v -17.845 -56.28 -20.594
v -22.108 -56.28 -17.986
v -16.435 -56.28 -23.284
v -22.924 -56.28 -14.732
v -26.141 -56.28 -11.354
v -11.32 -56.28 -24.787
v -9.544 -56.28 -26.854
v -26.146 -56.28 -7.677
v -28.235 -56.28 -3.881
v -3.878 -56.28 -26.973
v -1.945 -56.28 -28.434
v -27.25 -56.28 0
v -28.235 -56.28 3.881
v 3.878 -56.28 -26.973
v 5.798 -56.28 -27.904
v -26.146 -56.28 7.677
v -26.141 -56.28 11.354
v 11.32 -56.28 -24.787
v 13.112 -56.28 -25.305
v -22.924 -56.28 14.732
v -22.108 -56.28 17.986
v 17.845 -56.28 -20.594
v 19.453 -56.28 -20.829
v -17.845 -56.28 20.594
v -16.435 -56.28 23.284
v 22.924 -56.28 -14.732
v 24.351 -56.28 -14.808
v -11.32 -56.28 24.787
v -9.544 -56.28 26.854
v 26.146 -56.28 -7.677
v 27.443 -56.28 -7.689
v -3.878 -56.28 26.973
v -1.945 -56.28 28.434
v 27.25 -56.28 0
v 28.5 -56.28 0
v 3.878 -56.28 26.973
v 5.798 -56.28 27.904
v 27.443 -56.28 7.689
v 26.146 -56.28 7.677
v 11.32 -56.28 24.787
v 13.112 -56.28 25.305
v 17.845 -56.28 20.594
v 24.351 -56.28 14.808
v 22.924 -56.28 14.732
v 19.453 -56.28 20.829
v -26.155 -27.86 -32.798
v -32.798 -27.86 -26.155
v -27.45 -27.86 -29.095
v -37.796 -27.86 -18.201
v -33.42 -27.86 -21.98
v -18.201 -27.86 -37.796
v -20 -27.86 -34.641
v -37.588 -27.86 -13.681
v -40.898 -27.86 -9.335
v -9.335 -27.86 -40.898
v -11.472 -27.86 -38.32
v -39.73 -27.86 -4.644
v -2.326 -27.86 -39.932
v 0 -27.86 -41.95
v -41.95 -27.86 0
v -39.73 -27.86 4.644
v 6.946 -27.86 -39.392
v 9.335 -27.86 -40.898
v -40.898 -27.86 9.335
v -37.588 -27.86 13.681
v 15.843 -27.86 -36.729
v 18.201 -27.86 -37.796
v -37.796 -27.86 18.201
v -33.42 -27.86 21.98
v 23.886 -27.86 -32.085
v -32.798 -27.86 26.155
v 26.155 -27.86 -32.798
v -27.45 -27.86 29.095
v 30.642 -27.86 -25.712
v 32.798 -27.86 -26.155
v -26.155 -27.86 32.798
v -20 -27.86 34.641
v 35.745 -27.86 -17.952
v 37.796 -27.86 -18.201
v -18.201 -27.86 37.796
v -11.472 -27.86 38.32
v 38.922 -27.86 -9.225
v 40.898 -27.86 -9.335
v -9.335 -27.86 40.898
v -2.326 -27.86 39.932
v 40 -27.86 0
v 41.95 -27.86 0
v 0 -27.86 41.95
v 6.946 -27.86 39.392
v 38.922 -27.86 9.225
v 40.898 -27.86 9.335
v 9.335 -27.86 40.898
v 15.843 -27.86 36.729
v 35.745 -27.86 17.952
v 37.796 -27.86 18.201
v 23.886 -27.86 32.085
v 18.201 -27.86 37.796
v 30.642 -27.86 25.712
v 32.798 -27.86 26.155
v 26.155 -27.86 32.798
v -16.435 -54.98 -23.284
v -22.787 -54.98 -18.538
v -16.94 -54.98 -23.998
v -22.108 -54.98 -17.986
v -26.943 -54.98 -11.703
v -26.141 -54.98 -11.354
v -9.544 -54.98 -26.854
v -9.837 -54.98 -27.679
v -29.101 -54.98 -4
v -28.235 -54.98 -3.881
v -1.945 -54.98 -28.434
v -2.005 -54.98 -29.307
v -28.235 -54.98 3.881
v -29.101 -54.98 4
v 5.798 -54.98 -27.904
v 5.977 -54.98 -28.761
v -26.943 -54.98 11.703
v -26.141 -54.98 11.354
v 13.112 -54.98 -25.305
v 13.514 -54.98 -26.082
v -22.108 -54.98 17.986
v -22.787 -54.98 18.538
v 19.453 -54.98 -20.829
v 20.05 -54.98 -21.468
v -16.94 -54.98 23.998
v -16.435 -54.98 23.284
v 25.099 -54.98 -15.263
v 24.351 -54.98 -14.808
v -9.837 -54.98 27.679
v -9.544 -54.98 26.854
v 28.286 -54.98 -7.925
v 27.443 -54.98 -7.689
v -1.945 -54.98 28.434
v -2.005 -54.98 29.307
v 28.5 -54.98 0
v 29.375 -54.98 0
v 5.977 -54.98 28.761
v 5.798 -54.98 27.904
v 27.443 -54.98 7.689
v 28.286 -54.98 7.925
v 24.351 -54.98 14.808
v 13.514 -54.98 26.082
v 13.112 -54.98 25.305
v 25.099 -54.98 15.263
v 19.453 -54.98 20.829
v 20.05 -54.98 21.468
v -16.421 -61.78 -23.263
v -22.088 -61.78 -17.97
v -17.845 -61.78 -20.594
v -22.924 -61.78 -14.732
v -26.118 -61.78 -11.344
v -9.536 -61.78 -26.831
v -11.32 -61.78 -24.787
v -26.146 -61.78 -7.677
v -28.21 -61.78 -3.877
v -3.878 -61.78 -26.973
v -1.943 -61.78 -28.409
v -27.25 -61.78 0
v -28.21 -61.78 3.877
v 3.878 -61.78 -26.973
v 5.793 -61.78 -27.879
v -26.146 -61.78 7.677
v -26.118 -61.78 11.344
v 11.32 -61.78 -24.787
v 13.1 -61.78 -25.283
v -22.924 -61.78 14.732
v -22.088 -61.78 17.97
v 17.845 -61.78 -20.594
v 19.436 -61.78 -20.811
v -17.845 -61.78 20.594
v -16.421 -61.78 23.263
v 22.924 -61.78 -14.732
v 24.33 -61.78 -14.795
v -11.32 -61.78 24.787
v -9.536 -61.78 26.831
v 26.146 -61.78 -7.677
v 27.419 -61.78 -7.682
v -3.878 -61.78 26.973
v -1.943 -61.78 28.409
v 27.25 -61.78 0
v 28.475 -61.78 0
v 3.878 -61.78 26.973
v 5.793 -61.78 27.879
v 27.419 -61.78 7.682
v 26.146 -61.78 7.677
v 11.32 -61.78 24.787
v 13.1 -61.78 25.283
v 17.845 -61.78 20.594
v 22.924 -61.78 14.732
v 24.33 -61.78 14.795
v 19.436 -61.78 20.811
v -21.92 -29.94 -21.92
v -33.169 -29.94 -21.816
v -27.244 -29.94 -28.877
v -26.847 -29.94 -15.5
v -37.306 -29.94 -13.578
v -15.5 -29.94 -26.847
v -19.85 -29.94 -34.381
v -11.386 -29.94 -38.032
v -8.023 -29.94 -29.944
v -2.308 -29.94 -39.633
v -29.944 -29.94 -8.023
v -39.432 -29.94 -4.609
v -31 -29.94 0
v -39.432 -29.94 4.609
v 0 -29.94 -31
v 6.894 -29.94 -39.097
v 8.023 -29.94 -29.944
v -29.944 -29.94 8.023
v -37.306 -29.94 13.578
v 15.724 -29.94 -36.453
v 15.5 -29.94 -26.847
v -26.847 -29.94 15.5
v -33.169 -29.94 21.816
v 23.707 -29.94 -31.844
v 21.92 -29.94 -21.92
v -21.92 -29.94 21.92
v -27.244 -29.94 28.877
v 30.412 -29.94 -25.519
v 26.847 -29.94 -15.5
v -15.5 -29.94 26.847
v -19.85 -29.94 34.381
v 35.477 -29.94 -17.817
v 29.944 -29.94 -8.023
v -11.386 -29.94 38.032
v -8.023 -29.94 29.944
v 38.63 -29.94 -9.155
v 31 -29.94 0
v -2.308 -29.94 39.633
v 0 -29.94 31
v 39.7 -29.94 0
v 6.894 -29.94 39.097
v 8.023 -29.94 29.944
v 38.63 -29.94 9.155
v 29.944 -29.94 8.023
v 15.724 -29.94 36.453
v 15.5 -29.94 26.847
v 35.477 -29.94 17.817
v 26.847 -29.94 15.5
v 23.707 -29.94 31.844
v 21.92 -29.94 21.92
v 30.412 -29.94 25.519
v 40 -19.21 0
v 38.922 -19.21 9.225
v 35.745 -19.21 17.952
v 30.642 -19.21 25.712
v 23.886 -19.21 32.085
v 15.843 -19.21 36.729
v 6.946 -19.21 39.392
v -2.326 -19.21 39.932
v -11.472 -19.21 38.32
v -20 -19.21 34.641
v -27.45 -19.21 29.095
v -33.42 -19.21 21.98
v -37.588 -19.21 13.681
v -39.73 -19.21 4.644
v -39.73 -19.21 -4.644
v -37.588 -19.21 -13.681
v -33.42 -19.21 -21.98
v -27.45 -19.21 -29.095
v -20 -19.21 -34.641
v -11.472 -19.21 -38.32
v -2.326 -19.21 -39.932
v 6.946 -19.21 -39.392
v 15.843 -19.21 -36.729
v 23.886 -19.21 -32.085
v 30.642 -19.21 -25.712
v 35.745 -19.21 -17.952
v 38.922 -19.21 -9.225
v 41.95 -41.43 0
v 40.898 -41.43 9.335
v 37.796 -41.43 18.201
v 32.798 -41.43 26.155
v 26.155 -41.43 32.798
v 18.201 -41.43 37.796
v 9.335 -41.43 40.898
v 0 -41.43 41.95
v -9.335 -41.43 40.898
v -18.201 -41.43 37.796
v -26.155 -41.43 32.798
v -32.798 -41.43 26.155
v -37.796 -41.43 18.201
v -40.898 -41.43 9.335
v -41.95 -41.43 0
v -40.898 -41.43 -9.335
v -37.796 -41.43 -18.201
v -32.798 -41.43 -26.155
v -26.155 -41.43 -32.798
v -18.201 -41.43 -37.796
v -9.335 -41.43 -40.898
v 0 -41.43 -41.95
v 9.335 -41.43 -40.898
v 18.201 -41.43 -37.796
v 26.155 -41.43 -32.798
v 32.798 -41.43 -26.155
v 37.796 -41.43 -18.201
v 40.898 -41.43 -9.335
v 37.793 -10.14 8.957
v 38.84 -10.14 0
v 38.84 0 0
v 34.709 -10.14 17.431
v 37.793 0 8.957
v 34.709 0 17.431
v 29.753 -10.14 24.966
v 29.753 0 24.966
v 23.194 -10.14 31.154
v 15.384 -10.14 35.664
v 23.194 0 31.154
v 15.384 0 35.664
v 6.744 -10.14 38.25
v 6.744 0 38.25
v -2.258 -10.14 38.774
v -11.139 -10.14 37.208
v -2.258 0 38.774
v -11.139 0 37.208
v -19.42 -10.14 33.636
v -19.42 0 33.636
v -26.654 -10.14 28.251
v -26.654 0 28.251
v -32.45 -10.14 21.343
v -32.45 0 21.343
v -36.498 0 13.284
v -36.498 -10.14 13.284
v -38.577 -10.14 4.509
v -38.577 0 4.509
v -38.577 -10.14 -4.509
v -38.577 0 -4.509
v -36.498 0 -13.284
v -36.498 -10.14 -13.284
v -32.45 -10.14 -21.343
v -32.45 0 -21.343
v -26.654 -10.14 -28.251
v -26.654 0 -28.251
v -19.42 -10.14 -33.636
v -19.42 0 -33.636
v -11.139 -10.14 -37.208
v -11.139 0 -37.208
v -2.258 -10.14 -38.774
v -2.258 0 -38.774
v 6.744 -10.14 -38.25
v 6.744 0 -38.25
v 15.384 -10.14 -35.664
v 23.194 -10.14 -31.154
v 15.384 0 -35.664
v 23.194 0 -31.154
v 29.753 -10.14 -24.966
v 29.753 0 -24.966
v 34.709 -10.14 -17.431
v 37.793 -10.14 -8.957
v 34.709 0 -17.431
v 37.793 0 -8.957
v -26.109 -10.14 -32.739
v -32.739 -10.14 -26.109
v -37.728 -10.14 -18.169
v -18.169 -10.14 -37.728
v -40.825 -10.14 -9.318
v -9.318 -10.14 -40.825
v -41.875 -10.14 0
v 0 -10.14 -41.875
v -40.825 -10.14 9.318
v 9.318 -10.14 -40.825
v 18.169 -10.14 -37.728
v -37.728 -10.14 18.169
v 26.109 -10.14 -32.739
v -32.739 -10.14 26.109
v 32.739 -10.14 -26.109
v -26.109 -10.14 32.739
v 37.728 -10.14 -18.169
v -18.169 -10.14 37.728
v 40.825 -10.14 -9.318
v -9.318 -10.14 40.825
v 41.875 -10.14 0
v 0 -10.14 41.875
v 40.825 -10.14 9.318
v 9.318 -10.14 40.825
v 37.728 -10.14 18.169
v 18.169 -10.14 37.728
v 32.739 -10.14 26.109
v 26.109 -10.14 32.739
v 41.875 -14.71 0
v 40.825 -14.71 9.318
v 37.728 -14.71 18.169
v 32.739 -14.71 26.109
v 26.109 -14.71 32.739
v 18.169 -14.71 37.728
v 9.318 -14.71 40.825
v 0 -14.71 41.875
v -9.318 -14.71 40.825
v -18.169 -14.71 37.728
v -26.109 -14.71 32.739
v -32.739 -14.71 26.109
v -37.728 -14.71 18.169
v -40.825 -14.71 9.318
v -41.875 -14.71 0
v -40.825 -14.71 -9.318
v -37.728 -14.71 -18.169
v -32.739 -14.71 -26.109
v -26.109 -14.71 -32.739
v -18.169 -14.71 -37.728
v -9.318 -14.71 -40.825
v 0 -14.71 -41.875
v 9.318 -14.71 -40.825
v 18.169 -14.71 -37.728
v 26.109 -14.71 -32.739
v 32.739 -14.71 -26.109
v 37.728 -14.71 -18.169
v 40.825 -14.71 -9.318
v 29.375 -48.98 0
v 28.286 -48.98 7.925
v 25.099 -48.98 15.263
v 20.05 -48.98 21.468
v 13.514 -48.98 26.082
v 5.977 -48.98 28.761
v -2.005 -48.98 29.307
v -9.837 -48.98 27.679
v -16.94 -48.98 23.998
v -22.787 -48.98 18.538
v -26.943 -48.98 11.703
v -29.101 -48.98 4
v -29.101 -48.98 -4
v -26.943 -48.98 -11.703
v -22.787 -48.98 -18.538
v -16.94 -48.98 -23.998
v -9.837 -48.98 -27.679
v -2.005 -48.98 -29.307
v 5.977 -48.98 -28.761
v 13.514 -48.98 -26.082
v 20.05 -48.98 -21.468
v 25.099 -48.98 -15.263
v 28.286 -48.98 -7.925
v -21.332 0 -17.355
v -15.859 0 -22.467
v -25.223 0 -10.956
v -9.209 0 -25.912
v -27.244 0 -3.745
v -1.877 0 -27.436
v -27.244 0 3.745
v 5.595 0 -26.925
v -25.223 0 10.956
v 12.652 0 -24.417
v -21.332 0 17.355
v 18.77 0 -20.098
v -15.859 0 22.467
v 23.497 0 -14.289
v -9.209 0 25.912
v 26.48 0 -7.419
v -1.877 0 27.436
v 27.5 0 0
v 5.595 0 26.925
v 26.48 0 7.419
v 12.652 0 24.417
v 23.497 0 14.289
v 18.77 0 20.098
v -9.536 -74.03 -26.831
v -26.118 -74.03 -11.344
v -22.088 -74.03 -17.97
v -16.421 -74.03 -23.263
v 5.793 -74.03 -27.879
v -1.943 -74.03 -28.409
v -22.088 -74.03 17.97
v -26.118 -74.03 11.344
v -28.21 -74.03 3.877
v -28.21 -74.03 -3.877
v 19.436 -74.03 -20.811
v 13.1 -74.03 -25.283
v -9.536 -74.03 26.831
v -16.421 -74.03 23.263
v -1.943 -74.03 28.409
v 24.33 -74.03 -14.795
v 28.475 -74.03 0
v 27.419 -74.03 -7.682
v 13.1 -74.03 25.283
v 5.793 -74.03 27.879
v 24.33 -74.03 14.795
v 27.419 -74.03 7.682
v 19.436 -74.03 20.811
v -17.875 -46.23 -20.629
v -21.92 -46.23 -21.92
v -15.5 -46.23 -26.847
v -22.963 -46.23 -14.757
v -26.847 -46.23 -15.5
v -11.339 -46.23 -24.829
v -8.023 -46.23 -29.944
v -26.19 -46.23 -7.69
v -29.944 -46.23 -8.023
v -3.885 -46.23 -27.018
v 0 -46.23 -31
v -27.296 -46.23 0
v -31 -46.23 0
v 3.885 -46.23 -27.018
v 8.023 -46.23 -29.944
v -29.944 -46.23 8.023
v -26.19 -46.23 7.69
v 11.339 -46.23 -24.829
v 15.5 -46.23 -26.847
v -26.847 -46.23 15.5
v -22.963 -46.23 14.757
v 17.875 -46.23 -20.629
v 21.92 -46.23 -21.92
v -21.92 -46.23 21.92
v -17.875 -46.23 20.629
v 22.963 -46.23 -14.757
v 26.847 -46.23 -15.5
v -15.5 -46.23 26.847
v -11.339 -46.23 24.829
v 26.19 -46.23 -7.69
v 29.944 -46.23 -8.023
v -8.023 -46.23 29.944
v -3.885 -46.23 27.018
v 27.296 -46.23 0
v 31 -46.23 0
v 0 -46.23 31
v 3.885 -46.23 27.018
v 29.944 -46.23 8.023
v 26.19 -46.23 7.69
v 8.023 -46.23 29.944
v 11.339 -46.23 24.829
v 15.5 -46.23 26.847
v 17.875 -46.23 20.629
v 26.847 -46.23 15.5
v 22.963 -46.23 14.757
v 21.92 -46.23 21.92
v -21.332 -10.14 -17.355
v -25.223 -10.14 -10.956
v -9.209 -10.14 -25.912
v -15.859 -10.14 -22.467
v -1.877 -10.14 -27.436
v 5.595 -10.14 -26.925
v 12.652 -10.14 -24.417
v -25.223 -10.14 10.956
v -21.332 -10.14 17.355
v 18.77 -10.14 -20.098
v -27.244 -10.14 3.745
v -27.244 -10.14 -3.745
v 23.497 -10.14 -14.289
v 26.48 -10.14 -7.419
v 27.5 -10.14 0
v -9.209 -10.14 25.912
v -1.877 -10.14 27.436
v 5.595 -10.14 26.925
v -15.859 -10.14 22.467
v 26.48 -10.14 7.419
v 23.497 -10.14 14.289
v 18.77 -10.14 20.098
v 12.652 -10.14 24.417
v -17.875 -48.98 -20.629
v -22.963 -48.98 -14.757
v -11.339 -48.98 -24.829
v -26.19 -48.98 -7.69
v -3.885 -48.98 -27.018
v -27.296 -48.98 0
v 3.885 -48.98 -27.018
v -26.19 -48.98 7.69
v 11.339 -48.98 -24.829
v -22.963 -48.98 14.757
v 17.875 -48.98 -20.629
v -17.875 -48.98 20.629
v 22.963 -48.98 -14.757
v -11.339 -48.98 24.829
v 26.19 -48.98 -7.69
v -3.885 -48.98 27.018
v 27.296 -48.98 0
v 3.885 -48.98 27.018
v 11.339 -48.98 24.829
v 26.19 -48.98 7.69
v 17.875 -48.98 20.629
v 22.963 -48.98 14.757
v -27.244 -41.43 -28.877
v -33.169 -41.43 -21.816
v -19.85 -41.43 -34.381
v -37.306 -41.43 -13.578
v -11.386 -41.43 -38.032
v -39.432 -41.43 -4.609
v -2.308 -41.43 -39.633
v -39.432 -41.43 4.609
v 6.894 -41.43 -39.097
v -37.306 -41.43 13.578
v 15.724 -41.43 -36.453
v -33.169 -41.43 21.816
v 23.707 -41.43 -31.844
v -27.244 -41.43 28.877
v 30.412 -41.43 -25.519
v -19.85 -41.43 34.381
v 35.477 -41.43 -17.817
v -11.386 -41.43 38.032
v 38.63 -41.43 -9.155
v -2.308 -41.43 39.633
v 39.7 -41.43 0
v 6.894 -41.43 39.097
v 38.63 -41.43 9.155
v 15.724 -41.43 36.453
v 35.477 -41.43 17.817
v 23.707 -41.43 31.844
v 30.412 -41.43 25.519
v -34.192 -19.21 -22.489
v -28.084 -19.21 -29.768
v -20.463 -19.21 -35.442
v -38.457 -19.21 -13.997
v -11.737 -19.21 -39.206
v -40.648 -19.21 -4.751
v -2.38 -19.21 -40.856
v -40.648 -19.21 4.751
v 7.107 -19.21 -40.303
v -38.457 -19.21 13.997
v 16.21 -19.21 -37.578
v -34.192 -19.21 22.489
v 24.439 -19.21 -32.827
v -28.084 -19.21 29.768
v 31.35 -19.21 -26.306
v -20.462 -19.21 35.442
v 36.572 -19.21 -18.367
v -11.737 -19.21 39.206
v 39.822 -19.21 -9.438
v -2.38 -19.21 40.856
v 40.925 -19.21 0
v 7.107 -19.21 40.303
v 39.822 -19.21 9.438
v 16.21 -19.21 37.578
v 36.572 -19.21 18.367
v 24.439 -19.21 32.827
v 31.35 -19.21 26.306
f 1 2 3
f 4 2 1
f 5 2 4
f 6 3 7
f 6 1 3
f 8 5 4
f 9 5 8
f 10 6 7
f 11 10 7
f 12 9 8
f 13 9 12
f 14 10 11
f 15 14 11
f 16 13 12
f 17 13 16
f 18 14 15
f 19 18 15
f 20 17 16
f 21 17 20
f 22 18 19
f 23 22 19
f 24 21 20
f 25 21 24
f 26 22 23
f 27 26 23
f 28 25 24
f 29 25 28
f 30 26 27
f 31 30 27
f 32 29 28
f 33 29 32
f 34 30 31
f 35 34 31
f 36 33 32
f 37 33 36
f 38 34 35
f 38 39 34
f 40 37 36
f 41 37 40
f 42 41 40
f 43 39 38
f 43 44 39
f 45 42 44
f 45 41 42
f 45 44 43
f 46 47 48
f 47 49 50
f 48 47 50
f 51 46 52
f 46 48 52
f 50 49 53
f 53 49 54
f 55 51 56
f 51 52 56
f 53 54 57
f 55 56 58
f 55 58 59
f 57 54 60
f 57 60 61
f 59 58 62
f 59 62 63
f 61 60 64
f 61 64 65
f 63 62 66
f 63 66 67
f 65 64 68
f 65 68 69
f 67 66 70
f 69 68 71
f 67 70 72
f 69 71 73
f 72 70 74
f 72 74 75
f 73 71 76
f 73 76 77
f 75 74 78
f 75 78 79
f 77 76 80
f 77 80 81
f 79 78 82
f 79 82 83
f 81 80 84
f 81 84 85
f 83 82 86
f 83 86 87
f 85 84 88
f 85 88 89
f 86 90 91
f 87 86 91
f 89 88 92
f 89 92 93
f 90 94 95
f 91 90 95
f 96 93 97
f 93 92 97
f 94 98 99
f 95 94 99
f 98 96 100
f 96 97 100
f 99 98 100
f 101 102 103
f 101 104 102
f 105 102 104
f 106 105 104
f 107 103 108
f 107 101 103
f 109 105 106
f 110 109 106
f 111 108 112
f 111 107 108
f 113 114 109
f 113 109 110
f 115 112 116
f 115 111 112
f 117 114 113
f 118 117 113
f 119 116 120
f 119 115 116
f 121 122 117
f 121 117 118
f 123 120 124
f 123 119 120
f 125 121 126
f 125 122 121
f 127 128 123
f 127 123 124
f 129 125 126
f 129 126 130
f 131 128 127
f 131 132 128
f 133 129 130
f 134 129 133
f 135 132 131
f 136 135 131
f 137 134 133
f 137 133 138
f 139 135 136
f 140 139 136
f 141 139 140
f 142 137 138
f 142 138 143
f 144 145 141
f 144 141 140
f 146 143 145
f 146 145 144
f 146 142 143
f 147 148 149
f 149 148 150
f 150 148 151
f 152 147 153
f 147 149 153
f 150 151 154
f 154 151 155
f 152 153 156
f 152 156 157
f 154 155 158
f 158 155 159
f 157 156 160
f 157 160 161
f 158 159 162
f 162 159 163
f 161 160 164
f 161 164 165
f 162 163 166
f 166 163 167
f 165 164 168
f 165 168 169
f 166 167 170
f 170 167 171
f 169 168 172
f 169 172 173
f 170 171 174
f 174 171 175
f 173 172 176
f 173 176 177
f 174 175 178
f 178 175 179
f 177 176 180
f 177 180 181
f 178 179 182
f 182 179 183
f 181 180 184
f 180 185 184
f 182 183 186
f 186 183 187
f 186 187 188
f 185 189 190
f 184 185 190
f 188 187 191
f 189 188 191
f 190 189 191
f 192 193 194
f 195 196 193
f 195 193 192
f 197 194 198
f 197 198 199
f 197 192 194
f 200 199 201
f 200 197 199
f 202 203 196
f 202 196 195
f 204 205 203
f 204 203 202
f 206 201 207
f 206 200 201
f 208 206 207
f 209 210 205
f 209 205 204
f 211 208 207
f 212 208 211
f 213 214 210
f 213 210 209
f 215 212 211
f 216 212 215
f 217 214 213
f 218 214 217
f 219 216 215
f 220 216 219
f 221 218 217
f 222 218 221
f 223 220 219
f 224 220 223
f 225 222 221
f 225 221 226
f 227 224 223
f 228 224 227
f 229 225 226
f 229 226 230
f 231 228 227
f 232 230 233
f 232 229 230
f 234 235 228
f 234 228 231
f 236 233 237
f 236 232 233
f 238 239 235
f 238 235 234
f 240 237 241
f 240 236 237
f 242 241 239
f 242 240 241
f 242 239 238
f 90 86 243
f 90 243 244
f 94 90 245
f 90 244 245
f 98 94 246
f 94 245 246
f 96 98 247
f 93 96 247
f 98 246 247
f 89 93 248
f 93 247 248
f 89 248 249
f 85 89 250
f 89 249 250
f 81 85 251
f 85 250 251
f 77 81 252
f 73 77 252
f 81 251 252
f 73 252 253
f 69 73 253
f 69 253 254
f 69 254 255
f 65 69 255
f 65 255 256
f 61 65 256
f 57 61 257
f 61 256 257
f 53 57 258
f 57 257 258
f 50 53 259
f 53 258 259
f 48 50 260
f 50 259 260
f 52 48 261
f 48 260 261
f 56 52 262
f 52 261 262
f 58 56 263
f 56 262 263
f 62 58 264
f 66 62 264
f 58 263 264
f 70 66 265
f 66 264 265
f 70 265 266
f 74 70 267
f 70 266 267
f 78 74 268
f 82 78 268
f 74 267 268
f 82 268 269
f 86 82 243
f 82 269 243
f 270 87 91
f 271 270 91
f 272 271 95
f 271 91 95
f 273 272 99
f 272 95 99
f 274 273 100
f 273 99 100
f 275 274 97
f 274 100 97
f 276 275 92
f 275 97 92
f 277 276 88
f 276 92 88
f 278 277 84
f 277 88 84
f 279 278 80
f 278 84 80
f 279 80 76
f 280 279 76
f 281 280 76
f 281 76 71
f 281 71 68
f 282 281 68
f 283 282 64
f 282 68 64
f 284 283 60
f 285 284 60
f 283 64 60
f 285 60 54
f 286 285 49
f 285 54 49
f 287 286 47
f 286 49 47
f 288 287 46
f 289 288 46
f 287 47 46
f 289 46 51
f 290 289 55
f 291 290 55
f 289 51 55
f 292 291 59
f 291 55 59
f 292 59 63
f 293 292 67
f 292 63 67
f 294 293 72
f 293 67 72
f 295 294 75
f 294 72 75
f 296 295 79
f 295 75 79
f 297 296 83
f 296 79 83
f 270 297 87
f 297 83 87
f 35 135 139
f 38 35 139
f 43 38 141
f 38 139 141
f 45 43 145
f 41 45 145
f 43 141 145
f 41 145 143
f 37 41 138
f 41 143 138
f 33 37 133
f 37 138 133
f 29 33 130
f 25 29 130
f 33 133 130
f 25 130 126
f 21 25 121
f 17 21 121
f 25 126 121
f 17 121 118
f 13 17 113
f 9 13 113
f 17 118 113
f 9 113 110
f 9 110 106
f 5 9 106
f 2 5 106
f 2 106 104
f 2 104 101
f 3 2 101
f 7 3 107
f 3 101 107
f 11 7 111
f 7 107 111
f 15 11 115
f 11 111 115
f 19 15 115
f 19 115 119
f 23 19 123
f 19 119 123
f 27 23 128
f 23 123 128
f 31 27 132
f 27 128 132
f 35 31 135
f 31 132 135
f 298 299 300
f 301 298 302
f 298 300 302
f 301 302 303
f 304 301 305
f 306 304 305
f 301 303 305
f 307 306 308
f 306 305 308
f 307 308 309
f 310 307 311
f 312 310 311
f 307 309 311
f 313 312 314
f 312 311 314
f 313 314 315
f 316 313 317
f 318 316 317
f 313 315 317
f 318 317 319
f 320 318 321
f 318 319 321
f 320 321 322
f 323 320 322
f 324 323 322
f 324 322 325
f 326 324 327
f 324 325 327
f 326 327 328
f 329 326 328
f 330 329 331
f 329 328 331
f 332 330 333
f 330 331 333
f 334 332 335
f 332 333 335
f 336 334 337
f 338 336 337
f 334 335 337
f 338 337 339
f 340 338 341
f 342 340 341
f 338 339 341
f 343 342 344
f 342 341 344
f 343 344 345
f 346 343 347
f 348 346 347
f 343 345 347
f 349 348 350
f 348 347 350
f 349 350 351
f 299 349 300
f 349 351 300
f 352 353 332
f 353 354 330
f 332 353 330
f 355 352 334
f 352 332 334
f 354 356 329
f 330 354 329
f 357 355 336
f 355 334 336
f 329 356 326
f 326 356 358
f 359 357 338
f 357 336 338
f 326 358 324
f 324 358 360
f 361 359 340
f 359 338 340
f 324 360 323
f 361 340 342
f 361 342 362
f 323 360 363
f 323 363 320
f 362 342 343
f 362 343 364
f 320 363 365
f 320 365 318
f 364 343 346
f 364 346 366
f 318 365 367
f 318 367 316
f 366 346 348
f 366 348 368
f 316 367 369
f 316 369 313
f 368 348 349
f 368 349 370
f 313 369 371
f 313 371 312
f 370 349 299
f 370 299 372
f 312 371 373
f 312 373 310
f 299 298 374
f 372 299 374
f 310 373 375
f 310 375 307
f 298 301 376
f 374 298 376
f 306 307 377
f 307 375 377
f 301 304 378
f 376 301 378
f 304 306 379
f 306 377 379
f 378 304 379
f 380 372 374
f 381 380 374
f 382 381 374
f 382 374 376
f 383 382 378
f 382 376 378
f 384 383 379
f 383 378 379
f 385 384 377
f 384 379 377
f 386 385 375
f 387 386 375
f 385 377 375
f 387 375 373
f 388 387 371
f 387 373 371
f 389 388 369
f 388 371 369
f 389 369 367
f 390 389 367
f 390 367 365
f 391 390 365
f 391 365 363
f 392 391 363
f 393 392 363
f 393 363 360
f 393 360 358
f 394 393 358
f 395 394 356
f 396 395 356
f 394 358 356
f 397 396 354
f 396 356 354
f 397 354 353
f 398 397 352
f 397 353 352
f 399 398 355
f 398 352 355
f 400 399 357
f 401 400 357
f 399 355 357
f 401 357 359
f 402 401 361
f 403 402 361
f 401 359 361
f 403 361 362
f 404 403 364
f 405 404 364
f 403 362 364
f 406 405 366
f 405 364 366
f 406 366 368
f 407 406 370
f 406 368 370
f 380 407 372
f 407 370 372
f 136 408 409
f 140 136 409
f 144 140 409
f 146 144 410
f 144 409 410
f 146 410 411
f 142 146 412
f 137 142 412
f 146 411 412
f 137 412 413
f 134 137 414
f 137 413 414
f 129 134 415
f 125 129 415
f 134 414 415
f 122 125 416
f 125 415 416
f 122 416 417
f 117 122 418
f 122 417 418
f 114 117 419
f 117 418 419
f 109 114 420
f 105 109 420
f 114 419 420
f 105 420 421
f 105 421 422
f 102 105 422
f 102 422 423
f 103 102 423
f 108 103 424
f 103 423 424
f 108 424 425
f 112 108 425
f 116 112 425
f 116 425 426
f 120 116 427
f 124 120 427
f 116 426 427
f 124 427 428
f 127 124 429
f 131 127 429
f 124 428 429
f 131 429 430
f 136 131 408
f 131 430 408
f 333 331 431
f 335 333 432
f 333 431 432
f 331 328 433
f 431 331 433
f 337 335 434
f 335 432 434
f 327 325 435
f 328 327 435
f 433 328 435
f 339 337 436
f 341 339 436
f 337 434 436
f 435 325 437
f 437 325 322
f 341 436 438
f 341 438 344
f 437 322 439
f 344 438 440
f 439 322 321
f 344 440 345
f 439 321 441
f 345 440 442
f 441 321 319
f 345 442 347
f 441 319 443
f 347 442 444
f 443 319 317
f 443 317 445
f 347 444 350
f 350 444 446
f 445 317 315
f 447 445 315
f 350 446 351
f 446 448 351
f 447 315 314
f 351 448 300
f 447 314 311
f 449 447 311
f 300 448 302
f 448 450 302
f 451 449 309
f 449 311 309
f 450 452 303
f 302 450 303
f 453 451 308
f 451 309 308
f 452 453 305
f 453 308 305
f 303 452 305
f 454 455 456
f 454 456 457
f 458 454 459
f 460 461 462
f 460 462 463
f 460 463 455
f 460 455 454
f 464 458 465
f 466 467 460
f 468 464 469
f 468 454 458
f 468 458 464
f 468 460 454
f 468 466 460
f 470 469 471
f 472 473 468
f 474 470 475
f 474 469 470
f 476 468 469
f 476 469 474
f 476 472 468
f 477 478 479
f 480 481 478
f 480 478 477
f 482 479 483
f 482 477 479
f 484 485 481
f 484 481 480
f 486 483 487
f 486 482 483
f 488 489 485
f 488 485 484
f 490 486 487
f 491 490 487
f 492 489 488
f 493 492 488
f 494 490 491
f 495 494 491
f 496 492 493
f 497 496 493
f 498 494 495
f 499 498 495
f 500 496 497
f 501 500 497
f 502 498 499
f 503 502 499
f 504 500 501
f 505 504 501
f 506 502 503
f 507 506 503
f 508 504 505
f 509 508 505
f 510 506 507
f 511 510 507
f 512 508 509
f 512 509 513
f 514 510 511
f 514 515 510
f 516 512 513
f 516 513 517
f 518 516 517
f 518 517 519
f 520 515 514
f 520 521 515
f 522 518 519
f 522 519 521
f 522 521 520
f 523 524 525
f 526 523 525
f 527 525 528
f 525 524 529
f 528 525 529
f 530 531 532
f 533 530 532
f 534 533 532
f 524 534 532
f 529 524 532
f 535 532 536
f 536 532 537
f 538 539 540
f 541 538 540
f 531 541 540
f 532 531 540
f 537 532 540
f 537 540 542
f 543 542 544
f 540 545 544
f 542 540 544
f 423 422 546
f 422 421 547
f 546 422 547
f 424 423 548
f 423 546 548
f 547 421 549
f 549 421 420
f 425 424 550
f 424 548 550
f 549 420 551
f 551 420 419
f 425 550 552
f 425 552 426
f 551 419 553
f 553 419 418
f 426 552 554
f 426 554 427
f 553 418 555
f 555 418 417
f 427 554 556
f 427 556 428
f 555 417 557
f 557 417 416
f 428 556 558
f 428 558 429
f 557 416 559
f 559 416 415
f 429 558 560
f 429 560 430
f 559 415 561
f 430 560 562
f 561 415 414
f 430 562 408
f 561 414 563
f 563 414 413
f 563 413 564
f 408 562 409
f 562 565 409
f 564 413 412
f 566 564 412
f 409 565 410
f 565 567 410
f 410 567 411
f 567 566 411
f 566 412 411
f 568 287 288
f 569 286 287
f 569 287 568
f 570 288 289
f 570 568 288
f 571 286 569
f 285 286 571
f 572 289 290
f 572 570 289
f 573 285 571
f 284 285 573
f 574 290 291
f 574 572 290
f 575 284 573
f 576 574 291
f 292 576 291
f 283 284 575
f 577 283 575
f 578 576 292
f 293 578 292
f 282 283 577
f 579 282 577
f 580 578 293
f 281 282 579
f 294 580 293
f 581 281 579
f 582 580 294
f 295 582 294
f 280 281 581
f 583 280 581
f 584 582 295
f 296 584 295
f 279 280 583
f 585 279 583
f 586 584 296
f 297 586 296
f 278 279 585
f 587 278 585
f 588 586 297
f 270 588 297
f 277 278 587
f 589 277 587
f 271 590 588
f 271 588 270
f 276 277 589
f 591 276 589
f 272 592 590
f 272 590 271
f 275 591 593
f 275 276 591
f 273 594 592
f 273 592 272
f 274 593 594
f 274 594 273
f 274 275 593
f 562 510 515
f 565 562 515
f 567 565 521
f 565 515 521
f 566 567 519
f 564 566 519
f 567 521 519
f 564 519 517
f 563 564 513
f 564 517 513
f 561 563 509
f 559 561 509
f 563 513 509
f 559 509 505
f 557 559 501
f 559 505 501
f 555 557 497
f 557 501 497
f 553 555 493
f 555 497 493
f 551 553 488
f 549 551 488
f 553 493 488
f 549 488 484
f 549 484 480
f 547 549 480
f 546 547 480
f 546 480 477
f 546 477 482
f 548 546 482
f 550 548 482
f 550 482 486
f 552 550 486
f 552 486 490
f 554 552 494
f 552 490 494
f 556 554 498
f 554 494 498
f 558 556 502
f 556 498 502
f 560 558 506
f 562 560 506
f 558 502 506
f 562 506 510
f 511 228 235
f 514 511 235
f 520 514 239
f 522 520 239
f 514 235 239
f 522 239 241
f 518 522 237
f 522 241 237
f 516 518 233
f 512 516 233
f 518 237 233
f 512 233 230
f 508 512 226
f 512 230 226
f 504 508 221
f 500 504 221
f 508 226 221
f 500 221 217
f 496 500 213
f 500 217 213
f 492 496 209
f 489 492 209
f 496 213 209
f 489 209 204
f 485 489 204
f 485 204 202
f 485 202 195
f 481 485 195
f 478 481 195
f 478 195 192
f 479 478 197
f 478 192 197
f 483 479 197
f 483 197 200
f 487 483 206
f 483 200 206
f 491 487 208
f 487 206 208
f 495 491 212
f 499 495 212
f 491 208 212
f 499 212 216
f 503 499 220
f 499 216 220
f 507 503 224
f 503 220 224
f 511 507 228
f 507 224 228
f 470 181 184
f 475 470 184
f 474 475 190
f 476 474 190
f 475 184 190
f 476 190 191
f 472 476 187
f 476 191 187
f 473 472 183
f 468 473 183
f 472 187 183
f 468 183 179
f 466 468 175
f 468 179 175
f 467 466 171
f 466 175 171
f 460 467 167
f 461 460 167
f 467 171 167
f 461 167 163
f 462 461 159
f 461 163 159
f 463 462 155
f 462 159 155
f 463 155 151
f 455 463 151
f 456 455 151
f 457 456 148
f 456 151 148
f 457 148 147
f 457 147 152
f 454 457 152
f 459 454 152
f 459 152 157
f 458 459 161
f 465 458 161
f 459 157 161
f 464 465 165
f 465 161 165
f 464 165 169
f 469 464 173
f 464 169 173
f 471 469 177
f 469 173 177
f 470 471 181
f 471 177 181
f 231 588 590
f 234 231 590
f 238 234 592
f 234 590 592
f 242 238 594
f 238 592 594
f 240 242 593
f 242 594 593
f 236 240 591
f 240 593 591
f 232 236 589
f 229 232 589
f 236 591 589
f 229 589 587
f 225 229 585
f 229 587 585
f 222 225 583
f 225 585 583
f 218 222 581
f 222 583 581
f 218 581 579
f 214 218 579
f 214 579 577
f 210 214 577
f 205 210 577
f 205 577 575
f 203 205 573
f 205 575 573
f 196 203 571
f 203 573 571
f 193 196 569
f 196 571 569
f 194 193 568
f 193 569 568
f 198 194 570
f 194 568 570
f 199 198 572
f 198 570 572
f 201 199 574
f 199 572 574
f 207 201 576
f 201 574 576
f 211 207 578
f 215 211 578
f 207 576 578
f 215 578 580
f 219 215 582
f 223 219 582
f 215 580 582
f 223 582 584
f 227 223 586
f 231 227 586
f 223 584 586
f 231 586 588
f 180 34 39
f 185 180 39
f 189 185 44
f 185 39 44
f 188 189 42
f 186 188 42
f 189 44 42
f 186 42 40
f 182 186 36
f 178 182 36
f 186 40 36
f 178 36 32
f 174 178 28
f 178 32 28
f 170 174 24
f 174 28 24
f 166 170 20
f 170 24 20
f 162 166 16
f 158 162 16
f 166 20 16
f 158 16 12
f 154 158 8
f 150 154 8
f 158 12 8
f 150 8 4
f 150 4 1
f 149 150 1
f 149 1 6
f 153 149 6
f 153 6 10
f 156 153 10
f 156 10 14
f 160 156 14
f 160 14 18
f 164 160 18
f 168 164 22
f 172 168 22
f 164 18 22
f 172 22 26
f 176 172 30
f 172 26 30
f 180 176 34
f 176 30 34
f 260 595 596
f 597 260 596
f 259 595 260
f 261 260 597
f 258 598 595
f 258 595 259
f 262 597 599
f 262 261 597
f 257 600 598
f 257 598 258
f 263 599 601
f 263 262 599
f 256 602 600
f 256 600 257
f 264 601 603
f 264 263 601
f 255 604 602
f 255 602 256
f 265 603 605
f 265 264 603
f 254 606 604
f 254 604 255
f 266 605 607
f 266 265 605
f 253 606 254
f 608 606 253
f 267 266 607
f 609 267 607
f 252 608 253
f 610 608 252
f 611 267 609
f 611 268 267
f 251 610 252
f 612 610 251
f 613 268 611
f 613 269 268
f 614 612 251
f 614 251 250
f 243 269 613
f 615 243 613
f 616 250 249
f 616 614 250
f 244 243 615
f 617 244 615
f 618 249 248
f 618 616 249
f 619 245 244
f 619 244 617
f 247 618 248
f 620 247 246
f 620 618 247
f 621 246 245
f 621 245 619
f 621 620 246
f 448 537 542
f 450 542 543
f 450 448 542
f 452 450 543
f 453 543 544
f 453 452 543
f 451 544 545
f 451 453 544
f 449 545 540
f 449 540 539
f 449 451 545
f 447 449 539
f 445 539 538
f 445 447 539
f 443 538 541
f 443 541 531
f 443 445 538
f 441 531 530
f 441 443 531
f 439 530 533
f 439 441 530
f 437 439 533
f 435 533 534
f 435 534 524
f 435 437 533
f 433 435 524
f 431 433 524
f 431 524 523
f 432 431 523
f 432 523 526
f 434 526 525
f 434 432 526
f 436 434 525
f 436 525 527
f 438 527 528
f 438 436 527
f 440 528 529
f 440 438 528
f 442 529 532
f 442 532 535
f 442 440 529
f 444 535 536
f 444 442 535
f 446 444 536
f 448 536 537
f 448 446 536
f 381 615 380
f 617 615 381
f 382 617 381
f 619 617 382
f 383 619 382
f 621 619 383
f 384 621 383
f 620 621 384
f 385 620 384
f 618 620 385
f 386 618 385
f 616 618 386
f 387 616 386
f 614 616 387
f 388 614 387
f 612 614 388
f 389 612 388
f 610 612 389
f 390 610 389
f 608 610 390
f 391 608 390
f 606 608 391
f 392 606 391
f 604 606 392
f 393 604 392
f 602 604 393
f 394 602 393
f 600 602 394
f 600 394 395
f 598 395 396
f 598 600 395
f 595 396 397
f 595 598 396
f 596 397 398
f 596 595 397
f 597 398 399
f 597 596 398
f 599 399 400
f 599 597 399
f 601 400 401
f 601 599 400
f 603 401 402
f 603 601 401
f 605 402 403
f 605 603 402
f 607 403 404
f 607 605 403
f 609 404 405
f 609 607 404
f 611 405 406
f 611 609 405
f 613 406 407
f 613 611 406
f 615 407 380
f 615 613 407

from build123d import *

# Parameters (mm, degrees)
F0_R      = 38.84
F0_R_2    = 27.5
F1_DEPTH  = 10.14
F2_R      = 41.875
F3_DEPTH  = 4.57
F4_R      = 41.875
F6_R      = 40.925
F8_R      = 40
F9_DEPTH  = 8.65
F10_R     = 41.95
F11_DEPTH = 13.57
F12_R     = 39.7
F13_DEPTH = 11.49
F14_R     = 31
F15_DEPTH = 16.29
F16_R     = 27.295707
F17_DEPTH = 2.75
F18_R     = 29.375
F19_DEPTH = 6
F20_R     = 28.5
F21_DEPTH = 1.3
F22_R     = 27.25
F23_DEPTH = 5.5
F24_R     = 28.475
F25_DEPTH = 12.25


with BuildPart() as f1:
    # F0 (on Front) → F1 (new body)
    with BuildSketch(Plane.XZ):
        Circle(F0_R)
        Circle(F0_R_2, mode=Mode.SUBTRACT)
    extrude(amount=F1_DEPTH)

    # F2 (on face) → F3 (join)
    with BuildSketch(Plane.XZ.offset(10.14)):
        Circle(F2_R)
    extrude(amount=F3_DEPTH)

    # F4 (on face) → F7 section 0
    with BuildSketch(Plane.XZ.offset(14.71)):
        Circle(F4_R)
    # F6 (on offset) → F7 section 1
    with BuildSketch(Plane.XZ.offset(19.21)):
        Circle(F6_R)
    loft()

    # F8 (on face) → F9 (join)
    with BuildSketch(Plane.XZ.offset(19.21)):
        Circle(F8_R)
    extrude(amount=F9_DEPTH)

    # F10 (on face) → F11 (join)
    with BuildSketch(Plane.XZ.offset(27.86)):
        Circle(F10_R)
    extrude(amount=F11_DEPTH)

    # F12 (on face) → F13 (cut)
    with BuildSketch(Plane.XZ.offset(41.43)):
        Circle(F12_R)
    extrude(amount=-F13_DEPTH, mode=Mode.SUBTRACT)

    # F14 (on face) → F15 (join)
    with BuildSketch(Plane.XZ.offset(29.94)):
        Circle(F14_R)
    extrude(amount=F15_DEPTH)

    # F16 (on face) → F17 (join)
    with BuildSketch(Plane.XZ.offset(46.23)):
        Circle(F16_R)
    extrude(amount=F17_DEPTH)

    # F18 (on face) → F19 (join)
    with BuildSketch(Plane.XZ.offset(48.98)):
        Circle(F18_R)
    extrude(amount=F19_DEPTH)

    # F20 (on face) → F21 (join)
    with BuildSketch(Plane.XZ.offset(54.98)):
        Circle(F20_R)
    extrude(amount=F21_DEPTH)

    # F22 (on face) → F23 (join)
    with BuildSketch(Plane.XZ.offset(56.28)):
        Circle(F22_R)
    extrude(amount=F23_DEPTH)

    # F24 (on face) → F25 (join)
    with BuildSketch(Plane.XZ.offset(61.78)):
        Circle(F24_R)
    extrude(amount=F25_DEPTH)


solid = f1.part
